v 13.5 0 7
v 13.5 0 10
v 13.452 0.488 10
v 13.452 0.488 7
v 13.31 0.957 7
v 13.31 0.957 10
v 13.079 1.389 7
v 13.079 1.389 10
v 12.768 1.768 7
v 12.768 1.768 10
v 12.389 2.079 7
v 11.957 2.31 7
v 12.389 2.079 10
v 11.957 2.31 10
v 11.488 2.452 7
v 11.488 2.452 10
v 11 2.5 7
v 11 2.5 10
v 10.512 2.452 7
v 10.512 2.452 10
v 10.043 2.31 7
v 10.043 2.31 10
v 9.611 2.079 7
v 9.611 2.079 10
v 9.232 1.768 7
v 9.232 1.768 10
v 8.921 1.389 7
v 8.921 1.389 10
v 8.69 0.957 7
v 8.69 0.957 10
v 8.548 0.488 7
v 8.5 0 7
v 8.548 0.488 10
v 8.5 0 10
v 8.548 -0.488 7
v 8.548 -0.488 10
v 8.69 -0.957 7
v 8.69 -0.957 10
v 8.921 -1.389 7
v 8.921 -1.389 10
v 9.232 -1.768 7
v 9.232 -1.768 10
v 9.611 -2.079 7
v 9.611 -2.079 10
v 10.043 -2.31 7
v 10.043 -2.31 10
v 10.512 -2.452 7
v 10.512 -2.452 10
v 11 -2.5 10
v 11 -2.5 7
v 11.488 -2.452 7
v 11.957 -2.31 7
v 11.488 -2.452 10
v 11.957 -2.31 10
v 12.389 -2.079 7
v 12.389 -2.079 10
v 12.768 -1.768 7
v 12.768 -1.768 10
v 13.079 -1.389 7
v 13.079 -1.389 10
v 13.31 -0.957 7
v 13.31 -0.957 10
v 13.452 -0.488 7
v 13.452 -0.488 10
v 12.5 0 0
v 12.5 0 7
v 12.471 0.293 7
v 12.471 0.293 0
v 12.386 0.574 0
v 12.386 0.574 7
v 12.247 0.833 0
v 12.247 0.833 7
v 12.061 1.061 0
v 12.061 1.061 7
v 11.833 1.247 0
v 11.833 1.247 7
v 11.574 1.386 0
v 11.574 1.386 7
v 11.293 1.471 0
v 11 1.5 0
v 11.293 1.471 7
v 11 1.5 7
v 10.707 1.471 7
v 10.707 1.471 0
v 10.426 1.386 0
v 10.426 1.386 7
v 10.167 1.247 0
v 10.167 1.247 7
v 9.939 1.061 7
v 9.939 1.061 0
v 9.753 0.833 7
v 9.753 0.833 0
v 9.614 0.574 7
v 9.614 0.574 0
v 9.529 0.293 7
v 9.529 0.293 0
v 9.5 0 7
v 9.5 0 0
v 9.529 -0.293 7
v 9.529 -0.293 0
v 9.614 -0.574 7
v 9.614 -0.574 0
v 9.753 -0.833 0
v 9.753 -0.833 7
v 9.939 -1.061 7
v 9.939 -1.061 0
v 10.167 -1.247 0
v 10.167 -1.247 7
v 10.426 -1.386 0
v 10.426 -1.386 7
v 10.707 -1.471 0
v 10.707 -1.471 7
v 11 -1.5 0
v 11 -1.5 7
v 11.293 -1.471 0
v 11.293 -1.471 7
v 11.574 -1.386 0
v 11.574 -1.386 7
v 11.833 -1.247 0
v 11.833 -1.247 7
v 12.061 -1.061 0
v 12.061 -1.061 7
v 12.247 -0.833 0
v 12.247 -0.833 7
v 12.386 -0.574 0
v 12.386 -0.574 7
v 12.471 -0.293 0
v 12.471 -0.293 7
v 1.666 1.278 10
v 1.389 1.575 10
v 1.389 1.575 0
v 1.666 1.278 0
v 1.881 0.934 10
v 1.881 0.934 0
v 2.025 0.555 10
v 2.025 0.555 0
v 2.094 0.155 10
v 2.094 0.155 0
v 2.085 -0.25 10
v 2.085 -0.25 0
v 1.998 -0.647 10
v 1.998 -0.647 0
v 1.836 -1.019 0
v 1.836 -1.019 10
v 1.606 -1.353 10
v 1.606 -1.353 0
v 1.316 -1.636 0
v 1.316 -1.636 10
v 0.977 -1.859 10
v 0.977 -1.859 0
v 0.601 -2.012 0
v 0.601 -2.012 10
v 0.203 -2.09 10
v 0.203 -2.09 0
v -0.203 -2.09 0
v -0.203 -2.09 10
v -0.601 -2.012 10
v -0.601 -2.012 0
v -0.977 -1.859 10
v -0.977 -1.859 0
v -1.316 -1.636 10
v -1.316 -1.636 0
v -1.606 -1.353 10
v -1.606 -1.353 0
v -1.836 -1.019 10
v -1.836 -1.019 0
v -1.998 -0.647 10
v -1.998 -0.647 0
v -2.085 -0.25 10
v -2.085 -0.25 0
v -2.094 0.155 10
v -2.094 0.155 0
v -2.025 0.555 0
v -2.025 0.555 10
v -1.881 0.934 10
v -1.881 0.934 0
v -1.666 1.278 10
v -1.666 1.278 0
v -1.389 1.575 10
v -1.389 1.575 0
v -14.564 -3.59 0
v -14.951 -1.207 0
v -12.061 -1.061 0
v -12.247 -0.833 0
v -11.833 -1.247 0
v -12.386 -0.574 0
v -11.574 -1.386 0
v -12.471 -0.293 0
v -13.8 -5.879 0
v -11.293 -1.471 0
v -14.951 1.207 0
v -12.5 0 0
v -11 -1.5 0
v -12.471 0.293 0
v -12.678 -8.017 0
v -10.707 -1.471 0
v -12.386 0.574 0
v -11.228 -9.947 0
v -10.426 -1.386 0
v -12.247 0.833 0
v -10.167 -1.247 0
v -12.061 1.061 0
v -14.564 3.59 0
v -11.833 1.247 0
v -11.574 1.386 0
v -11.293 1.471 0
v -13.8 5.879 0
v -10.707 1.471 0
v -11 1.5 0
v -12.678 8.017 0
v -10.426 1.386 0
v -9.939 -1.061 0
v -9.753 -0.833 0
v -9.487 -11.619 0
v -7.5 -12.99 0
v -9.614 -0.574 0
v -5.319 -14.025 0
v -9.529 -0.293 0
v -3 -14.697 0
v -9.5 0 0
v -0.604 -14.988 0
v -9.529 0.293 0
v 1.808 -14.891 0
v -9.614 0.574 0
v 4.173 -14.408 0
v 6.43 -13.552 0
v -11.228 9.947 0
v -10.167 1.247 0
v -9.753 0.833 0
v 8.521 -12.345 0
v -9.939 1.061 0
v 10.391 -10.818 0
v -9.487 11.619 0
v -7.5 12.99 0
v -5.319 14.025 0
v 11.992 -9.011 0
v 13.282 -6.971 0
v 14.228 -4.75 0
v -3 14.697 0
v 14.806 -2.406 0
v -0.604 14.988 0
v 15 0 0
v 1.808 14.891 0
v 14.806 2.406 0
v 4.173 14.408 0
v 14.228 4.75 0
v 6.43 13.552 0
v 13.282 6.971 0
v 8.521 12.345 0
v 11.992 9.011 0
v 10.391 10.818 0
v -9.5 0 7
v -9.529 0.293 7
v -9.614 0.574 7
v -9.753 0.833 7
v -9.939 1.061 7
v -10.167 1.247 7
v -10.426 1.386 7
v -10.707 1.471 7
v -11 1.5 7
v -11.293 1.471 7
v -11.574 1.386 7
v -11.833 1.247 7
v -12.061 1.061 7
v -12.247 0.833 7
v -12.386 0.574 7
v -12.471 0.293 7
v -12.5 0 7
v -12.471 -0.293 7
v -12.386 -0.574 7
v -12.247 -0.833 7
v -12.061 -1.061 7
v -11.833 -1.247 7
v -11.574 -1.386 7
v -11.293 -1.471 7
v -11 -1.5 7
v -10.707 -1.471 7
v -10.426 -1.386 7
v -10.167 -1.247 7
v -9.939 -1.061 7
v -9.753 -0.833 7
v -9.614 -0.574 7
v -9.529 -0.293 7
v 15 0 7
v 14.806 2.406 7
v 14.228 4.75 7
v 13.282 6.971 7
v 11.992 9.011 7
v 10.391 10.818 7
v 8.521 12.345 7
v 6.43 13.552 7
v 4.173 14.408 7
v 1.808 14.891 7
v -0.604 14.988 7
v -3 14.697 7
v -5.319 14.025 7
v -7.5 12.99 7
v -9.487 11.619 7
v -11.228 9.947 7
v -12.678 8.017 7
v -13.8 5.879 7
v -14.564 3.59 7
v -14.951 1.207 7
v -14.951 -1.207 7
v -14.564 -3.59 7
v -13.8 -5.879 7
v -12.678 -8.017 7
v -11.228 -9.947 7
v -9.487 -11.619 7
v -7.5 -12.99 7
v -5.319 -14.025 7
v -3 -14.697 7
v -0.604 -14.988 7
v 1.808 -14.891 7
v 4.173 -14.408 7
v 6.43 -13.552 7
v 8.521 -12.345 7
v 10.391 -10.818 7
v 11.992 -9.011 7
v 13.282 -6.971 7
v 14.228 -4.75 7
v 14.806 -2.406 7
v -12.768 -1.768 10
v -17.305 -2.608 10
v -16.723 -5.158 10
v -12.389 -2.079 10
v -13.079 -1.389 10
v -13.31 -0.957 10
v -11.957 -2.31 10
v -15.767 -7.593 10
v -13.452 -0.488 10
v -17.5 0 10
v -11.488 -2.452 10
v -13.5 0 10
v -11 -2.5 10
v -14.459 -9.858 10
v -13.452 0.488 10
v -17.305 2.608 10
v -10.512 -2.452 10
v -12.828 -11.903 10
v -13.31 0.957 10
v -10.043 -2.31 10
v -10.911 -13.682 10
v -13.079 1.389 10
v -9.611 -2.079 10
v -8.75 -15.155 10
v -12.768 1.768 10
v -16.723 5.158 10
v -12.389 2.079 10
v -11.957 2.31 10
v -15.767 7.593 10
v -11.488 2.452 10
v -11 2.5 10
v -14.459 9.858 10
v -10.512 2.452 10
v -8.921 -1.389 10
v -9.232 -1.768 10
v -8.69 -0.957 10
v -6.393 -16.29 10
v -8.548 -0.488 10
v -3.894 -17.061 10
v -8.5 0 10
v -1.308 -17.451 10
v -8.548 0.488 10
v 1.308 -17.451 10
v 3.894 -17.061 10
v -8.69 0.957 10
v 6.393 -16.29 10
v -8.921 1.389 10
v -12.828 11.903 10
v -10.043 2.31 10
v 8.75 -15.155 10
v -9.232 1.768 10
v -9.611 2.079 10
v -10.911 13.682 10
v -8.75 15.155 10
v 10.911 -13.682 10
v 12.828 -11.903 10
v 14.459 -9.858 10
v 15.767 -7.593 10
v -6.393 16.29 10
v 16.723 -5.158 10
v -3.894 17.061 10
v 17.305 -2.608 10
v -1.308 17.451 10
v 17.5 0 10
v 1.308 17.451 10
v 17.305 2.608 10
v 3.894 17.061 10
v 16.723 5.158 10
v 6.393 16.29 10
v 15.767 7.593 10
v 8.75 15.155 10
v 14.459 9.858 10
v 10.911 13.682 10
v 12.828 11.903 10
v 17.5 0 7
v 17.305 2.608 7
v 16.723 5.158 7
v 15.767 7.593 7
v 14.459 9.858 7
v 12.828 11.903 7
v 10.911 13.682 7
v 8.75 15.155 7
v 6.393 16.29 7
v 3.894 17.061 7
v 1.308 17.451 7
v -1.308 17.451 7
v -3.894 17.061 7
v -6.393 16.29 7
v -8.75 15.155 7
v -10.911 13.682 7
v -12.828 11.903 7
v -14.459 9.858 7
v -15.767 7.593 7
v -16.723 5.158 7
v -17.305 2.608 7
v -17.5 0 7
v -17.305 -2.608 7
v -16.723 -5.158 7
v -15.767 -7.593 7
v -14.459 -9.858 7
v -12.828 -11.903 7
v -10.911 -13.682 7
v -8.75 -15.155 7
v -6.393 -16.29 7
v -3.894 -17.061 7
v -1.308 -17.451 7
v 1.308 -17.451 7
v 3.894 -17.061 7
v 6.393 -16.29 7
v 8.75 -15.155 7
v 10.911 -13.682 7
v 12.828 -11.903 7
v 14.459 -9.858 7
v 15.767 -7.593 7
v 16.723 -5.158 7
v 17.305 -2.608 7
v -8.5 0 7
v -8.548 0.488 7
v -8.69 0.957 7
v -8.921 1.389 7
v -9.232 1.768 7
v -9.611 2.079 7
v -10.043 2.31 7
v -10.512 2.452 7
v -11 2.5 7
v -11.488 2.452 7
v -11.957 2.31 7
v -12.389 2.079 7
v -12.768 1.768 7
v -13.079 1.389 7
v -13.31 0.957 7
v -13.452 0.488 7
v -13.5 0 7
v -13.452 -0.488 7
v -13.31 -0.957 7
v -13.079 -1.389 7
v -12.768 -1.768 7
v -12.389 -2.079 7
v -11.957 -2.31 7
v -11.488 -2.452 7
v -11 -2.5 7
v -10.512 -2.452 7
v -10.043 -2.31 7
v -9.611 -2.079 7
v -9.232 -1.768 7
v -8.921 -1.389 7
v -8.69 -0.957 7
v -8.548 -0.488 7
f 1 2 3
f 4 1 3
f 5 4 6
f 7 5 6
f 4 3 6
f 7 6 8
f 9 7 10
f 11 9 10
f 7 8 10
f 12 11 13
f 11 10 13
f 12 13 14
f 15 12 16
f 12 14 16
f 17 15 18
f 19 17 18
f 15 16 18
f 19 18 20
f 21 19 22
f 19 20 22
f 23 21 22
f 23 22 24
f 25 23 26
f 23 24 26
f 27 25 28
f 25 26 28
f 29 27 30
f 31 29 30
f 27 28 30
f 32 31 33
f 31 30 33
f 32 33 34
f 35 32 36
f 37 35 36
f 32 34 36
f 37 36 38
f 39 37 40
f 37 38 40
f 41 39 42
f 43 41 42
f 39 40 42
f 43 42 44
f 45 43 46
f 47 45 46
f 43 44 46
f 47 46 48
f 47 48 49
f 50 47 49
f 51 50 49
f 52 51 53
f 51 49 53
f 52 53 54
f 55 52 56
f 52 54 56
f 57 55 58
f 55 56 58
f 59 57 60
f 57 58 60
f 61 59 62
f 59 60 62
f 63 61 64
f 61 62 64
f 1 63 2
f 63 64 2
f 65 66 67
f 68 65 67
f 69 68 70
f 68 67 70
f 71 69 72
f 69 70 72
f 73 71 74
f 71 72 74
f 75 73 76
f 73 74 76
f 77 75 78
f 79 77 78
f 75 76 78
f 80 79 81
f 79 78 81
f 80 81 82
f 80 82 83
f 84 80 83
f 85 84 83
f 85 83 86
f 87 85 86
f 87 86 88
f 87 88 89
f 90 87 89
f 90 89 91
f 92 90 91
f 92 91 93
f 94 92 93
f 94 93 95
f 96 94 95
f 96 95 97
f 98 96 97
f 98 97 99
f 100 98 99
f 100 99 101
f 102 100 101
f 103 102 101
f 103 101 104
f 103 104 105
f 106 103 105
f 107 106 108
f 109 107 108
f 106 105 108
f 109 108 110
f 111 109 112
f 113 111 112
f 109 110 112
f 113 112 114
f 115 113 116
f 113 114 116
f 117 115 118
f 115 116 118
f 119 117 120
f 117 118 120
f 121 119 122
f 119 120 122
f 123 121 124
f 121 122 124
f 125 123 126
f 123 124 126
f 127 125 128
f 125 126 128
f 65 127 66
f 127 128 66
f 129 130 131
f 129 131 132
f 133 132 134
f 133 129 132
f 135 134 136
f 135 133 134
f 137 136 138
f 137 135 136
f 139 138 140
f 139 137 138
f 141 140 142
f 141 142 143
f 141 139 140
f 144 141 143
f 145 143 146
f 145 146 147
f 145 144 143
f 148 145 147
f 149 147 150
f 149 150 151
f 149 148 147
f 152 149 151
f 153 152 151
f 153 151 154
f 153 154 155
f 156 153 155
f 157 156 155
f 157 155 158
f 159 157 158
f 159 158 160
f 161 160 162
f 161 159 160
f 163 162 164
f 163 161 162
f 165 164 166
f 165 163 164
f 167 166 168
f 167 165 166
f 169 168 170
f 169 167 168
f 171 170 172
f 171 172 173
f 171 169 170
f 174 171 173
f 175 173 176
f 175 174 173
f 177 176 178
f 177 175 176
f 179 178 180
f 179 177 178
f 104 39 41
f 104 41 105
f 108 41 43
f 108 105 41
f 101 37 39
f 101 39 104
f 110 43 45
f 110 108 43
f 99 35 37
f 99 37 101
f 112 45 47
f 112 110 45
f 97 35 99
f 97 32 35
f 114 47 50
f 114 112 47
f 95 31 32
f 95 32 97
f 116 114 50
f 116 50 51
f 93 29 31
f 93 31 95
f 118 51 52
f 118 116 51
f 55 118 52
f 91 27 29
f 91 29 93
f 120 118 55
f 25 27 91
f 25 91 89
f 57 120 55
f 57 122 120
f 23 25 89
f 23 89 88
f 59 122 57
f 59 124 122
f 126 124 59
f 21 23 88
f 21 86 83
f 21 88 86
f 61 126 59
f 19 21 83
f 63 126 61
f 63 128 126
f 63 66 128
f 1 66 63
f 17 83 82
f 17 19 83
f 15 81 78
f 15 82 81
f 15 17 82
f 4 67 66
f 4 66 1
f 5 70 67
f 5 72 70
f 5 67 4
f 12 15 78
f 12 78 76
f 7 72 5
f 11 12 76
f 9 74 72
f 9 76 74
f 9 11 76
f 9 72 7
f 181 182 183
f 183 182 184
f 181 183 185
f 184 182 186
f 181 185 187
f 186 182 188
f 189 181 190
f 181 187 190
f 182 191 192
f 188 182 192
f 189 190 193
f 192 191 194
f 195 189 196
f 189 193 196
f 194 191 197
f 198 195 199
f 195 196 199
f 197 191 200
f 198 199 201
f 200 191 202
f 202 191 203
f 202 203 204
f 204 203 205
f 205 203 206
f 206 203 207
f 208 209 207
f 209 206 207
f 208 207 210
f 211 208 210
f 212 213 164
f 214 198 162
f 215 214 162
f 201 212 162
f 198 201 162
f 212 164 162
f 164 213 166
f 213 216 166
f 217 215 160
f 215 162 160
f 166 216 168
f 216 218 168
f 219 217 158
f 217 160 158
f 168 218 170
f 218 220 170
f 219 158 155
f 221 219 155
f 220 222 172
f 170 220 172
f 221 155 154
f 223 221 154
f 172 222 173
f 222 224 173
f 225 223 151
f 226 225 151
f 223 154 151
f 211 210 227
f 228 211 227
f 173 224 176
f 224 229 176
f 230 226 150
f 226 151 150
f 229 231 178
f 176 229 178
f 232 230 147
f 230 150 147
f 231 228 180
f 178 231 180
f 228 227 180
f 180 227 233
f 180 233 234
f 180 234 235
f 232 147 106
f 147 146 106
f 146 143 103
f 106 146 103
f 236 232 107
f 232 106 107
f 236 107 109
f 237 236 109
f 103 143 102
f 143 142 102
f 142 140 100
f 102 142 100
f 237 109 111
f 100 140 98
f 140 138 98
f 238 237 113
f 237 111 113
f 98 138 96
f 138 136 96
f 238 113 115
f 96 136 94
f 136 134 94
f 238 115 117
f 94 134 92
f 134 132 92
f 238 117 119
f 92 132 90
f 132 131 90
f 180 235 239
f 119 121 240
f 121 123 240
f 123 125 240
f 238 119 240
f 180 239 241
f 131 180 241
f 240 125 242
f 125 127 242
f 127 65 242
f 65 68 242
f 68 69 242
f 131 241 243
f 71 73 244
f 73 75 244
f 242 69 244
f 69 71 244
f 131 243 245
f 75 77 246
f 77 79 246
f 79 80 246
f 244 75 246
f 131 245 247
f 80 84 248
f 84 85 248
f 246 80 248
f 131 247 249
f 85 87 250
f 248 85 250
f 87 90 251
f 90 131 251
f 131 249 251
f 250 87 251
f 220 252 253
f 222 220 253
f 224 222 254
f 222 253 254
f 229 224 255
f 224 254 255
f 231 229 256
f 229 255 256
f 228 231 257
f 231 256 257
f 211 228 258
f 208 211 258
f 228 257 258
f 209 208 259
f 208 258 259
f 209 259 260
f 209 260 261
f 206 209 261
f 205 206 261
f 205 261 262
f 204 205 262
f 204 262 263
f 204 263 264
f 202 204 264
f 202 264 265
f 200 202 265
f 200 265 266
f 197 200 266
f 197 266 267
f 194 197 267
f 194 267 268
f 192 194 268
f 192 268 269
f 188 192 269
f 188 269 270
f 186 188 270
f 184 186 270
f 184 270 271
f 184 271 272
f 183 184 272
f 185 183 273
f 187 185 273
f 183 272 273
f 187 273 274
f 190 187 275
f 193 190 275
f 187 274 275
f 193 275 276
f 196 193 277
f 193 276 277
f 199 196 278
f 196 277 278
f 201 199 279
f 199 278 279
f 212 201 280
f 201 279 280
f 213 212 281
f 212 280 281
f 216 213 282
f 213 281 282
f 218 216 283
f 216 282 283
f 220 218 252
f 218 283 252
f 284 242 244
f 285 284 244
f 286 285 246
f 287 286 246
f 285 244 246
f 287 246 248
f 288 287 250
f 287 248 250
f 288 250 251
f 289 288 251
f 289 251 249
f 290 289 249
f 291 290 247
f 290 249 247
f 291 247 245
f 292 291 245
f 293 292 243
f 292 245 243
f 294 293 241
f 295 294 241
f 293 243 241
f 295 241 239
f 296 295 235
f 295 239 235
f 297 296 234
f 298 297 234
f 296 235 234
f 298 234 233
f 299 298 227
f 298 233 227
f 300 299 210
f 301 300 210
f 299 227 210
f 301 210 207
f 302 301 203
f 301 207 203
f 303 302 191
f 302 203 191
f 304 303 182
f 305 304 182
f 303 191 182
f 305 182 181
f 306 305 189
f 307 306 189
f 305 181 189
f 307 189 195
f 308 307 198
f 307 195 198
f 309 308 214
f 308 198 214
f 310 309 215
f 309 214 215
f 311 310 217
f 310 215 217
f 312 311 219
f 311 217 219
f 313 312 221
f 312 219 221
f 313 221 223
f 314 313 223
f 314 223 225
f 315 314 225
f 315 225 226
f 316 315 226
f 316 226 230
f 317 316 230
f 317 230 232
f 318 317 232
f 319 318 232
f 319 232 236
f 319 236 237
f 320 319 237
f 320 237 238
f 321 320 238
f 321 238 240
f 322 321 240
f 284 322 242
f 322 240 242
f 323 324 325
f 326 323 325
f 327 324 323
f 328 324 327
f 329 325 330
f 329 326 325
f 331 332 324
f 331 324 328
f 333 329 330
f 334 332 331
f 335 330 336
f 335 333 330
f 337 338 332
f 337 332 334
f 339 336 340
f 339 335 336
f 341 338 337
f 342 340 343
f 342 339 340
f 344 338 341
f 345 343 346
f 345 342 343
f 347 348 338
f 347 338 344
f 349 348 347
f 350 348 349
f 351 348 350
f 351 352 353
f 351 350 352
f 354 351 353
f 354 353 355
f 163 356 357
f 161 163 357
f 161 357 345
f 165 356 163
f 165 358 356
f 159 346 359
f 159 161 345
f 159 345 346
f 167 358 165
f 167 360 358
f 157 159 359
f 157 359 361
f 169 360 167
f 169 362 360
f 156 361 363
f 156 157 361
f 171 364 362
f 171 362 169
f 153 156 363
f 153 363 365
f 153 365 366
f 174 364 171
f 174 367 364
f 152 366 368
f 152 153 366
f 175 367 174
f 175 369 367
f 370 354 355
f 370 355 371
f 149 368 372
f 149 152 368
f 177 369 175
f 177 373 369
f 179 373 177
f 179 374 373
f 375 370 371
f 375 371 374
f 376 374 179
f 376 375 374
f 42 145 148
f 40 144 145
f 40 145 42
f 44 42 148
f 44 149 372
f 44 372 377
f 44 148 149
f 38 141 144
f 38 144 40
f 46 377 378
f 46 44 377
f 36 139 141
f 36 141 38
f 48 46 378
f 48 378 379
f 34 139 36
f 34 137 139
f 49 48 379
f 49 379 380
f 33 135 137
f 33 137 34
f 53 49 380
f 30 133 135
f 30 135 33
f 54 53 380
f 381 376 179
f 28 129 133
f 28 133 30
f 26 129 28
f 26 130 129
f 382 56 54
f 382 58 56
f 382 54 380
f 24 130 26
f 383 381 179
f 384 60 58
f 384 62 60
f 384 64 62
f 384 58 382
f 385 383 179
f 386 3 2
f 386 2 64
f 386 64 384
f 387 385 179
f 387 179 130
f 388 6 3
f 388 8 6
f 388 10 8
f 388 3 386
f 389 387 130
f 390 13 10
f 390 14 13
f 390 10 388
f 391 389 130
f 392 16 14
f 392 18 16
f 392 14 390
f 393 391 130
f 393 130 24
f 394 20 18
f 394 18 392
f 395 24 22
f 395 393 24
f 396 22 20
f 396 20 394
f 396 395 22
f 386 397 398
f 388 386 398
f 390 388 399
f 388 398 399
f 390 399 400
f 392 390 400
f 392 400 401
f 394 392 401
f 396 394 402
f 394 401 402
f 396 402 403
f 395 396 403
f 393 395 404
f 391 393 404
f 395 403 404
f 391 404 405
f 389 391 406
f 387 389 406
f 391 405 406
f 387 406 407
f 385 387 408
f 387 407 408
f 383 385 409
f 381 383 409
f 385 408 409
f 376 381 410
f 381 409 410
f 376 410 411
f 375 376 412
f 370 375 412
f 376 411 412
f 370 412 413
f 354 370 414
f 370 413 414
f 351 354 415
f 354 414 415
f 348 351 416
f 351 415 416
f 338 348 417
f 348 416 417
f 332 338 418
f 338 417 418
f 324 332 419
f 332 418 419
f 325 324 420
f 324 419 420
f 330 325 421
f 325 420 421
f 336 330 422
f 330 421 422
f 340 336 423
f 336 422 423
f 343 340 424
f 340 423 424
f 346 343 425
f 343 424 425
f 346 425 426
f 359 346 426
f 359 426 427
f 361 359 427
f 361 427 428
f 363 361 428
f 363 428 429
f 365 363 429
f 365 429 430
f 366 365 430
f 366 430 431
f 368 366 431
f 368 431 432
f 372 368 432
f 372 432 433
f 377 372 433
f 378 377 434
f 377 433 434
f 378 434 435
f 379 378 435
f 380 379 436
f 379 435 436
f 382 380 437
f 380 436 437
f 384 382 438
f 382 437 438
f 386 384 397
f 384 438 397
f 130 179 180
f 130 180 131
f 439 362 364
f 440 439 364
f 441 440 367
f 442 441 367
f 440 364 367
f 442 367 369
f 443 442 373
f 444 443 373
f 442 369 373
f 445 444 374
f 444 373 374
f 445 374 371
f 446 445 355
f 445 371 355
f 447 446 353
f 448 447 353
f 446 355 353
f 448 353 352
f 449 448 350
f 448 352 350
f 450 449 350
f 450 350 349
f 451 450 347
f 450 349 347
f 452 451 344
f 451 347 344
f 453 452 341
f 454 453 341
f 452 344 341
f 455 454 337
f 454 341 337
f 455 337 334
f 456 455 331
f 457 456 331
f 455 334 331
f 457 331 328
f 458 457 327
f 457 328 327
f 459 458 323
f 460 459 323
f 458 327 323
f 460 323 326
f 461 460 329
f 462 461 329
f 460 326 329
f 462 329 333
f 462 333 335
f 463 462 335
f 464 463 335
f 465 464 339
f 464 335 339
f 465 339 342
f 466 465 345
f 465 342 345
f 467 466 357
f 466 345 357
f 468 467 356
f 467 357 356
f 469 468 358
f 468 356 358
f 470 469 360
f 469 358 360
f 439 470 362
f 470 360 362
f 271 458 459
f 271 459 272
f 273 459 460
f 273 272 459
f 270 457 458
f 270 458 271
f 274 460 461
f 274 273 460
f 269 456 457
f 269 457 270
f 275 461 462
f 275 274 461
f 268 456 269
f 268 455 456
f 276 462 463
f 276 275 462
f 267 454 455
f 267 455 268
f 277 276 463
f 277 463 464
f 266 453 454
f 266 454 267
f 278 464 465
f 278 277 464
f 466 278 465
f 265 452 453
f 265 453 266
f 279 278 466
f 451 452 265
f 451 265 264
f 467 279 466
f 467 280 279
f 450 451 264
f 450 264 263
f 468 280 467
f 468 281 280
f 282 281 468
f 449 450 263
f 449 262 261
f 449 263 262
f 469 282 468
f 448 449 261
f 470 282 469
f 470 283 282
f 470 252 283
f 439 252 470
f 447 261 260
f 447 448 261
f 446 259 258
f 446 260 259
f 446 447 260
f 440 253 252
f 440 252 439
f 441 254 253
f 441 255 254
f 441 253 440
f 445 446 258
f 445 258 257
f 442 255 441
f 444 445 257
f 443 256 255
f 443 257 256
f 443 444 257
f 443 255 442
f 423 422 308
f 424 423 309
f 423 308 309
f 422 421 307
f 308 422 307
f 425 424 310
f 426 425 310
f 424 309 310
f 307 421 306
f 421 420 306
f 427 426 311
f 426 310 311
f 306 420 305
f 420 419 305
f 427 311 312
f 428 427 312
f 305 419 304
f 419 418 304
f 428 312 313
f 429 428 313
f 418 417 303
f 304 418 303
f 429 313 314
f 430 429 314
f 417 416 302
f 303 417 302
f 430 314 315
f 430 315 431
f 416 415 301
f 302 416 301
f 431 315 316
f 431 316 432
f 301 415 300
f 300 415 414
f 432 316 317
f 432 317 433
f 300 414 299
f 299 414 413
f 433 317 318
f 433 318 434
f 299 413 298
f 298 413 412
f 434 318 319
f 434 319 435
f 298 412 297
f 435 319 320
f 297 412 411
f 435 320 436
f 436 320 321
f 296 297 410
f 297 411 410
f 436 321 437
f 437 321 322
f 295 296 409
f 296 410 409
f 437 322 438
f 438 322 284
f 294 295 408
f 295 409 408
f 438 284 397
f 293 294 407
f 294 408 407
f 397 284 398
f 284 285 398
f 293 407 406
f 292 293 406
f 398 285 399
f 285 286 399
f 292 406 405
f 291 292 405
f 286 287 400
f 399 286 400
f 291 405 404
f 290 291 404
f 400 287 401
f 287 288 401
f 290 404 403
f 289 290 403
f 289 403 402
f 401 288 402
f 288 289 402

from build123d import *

# Parameters (mm, degrees)
SKETCH1_R           = 15
BOSS_EXTRUDE1_DEPTH = 7
SKETCH2_R           = 17.5
BOSS_EXTRUDE2_DEPTH = 3
SKETCH3_R           = 1.5
CUT_EXTRUDE1_DEPTH  = 10
SKETCH5_R           = 2.5
CUT_EXTRUDE3_DEPTH  = 3
CUT_EXTRUDE5_DEPTH  = 10


with BuildPart() as part:
    # Sketch1 → Boss-Extrude1 (new body)
    with BuildSketch(Plane.XY):
        Circle(SKETCH1_R)
    extrude(amount=BOSS_EXTRUDE1_DEPTH)

    # Sketch2 → Boss-Extrude2 (add)
    with BuildSketch(Plane.XY.offset(7)):
        Circle(SKETCH2_R)
    extrude(amount=BOSS_EXTRUDE2_DEPTH)

    # Sketch3 → Cut-Extrude1 (cut)
    with BuildSketch(Plane.XY.offset(10)):
        with Locations((-11, 0)):
            Circle(SKETCH3_R)
        with Locations((11, 0)):
            Circle(SKETCH3_R)
    extrude(amount=-CUT_EXTRUDE1_DEPTH, mode=Mode.SUBTRACT)

    # Sketch5 → Cut-Extrude3 (cut)
    with BuildSketch(Plane.XY.offset(10)):
        with Locations((11, 0)):
            Circle(SKETCH5_R)
        with Locations((-11, 0)):
            Circle(SKETCH5_R)
    extrude(amount=-CUT_EXTRUDE3_DEPTH, mode=Mode.SUBTRACT)

    # Sketch4 → Cut-Extrude5 (cut)
    with BuildSketch(Plane.XY.offset(10)):
        with BuildLine():
            Line((-1.389019438, 1.575), (1.389019438, 1.575))
            ThreePointArc((1.389019438, 1.575), (0, -2.1), (-1.389019438, 1.575))
        make_face()
    extrude(amount=-CUT_EXTRUDE5_DEPTH, mode=Mode.SUBTRACT)


solid = part.part
